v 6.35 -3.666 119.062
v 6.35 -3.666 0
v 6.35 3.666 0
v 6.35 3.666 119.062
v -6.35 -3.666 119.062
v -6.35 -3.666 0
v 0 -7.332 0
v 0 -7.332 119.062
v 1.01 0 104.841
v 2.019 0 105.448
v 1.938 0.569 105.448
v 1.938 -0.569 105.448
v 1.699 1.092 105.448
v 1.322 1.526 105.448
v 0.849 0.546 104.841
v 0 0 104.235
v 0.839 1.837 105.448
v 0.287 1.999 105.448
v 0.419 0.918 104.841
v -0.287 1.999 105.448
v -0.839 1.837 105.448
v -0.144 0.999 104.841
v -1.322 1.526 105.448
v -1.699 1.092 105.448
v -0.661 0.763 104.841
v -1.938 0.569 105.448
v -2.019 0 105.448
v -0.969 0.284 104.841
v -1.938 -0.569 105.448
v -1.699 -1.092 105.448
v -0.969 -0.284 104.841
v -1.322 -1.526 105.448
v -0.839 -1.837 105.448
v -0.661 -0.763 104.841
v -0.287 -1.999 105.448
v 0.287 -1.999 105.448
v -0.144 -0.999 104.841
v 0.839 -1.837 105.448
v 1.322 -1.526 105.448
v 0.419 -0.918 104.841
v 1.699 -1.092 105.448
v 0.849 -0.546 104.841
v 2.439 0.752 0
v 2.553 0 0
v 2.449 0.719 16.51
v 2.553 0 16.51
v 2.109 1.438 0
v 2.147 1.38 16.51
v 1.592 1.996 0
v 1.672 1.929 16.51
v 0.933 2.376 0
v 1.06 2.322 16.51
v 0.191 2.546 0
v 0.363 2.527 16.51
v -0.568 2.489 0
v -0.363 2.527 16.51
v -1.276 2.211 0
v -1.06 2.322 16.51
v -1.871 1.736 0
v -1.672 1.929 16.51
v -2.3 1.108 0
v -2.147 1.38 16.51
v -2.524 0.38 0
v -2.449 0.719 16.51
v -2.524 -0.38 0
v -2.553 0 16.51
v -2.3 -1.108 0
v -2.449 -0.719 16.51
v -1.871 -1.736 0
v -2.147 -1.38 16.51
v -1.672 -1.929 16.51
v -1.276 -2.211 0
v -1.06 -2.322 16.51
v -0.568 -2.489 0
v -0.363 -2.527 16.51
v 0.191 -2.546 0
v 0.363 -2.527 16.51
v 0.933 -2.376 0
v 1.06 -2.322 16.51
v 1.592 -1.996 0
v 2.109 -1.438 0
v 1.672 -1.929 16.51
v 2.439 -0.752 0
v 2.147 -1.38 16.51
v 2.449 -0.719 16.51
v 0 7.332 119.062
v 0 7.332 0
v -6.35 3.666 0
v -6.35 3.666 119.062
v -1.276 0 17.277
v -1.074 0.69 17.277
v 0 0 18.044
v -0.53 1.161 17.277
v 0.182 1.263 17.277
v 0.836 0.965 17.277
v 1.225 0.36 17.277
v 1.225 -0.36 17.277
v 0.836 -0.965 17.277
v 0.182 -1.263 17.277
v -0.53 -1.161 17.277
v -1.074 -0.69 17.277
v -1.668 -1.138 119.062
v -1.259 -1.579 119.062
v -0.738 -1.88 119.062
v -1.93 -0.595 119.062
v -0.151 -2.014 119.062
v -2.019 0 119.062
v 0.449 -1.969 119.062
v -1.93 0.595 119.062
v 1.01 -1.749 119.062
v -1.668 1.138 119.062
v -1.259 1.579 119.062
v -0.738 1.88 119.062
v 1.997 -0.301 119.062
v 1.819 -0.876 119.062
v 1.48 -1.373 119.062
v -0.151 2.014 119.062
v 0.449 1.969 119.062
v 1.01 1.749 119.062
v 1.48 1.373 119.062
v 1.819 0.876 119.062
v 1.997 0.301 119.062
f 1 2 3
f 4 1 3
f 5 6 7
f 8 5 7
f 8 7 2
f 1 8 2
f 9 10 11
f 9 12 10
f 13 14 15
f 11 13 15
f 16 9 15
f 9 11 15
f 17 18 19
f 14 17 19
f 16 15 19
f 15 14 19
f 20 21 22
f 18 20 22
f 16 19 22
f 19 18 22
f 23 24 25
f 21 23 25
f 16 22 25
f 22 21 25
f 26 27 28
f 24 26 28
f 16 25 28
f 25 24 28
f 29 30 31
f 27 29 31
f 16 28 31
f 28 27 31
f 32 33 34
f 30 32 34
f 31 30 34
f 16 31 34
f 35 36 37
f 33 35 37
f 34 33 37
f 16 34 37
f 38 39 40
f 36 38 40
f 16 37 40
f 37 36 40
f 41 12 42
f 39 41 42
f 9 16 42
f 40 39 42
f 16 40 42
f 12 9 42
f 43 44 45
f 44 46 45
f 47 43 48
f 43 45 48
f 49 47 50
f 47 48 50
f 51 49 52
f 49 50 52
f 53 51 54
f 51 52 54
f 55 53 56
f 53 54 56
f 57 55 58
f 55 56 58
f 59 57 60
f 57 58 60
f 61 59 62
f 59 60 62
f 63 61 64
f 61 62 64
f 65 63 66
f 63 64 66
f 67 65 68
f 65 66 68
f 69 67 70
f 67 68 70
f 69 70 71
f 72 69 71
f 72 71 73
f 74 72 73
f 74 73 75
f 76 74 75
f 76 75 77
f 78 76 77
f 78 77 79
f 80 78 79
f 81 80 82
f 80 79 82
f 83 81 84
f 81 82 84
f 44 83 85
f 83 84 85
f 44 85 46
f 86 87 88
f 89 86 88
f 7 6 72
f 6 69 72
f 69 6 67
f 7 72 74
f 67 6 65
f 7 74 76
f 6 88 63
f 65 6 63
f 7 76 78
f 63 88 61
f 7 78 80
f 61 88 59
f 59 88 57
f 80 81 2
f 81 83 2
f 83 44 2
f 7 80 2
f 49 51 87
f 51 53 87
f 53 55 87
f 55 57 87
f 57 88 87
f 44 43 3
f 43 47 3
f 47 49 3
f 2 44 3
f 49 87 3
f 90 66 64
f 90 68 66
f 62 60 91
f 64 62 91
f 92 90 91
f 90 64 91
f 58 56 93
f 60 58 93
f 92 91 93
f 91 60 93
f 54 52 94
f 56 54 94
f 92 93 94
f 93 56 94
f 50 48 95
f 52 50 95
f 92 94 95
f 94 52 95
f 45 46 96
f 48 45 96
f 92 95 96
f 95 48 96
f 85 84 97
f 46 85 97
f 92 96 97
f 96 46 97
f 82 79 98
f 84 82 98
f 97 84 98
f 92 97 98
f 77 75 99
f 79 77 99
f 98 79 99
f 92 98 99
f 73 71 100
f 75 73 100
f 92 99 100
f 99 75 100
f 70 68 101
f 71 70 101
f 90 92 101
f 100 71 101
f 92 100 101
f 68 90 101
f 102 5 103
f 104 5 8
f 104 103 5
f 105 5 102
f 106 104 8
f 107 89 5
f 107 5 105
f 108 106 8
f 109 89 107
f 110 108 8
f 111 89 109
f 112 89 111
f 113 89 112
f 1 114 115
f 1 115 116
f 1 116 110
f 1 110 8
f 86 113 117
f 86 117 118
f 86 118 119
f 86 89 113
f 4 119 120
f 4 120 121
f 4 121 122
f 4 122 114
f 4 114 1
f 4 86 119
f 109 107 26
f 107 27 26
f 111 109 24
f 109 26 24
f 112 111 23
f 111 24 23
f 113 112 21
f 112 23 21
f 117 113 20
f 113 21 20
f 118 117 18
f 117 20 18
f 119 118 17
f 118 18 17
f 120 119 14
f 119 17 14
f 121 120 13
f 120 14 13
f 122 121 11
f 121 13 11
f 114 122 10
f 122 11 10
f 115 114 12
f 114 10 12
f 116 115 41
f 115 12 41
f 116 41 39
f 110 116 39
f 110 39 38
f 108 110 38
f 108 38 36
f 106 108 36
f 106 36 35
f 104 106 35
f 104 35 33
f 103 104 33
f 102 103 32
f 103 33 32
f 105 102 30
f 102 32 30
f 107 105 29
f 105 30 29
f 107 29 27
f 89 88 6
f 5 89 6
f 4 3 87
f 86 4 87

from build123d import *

# Parameters (mm, degrees)
BOSS_EXTRUDE1_DEPTH         = 119.0625
F_1_4_20_TAPPED_HOLE2_D     = 5.1054
F_1_4_20_TAPPED_HOLE2_DEPTH = 16.51
F_1_4_20_TAPPED_HOLE2_TIP   = 1.533816902
F_10_32_TAPPED_HOLE1_D      = 4.0386
F_10_32_TAPPED_HOLE1_DEPTH  = 13.6144
F_10_32_TAPPED_HOLE1_TIP    = 1.213317848


with BuildPart() as part:
    # Sketch1 → Boss-Extrude1 (new body)
    with BuildSketch(Plane.XY):
        Polygon((0, 7.332348419), (-6.35, 3.666174209), (-6.35, -3.666174209), (0, -7.332348419), (6.35, -3.666174209), (6.35, 3.666174209), align=None)
    extrude(amount=BOSS_EXTRUDE1_DEPTH)

    # 1/4-20 Tapped Hole2
    with Locations(Plane(origin=(0, 0, 0), x_dir=(-1, 0, 0), z_dir=(0, 0, -1))):
        with Locations((0, 0)):
            Hole(F_1_4_20_TAPPED_HOLE2_D / 2, depth=F_1_4_20_TAPPED_HOLE2_DEPTH)
            with Locations((0, 0, -(F_1_4_20_TAPPED_HOLE2_DEPTH + F_1_4_20_TAPPED_HOLE2_TIP / 2))):  # 118° drill point
                Cone(0, F_1_4_20_TAPPED_HOLE2_D / 2, F_1_4_20_TAPPED_HOLE2_TIP, mode=Mode.SUBTRACT)

    # #10-32 Tapped Hole1
    with Locations(Plane.XY.offset(119.0625)):
        with Locations((0, 0)):
            Hole(F_10_32_TAPPED_HOLE1_D / 2, depth=F_10_32_TAPPED_HOLE1_DEPTH)
            with Locations((0, 0, -(F_10_32_TAPPED_HOLE1_DEPTH + F_10_32_TAPPED_HOLE1_TIP / 2))):  # 118° drill point
                Cone(0, F_10_32_TAPPED_HOLE1_D / 2, F_10_32_TAPPED_HOLE1_TIP, mode=Mode.SUBTRACT)


solid = part.part
